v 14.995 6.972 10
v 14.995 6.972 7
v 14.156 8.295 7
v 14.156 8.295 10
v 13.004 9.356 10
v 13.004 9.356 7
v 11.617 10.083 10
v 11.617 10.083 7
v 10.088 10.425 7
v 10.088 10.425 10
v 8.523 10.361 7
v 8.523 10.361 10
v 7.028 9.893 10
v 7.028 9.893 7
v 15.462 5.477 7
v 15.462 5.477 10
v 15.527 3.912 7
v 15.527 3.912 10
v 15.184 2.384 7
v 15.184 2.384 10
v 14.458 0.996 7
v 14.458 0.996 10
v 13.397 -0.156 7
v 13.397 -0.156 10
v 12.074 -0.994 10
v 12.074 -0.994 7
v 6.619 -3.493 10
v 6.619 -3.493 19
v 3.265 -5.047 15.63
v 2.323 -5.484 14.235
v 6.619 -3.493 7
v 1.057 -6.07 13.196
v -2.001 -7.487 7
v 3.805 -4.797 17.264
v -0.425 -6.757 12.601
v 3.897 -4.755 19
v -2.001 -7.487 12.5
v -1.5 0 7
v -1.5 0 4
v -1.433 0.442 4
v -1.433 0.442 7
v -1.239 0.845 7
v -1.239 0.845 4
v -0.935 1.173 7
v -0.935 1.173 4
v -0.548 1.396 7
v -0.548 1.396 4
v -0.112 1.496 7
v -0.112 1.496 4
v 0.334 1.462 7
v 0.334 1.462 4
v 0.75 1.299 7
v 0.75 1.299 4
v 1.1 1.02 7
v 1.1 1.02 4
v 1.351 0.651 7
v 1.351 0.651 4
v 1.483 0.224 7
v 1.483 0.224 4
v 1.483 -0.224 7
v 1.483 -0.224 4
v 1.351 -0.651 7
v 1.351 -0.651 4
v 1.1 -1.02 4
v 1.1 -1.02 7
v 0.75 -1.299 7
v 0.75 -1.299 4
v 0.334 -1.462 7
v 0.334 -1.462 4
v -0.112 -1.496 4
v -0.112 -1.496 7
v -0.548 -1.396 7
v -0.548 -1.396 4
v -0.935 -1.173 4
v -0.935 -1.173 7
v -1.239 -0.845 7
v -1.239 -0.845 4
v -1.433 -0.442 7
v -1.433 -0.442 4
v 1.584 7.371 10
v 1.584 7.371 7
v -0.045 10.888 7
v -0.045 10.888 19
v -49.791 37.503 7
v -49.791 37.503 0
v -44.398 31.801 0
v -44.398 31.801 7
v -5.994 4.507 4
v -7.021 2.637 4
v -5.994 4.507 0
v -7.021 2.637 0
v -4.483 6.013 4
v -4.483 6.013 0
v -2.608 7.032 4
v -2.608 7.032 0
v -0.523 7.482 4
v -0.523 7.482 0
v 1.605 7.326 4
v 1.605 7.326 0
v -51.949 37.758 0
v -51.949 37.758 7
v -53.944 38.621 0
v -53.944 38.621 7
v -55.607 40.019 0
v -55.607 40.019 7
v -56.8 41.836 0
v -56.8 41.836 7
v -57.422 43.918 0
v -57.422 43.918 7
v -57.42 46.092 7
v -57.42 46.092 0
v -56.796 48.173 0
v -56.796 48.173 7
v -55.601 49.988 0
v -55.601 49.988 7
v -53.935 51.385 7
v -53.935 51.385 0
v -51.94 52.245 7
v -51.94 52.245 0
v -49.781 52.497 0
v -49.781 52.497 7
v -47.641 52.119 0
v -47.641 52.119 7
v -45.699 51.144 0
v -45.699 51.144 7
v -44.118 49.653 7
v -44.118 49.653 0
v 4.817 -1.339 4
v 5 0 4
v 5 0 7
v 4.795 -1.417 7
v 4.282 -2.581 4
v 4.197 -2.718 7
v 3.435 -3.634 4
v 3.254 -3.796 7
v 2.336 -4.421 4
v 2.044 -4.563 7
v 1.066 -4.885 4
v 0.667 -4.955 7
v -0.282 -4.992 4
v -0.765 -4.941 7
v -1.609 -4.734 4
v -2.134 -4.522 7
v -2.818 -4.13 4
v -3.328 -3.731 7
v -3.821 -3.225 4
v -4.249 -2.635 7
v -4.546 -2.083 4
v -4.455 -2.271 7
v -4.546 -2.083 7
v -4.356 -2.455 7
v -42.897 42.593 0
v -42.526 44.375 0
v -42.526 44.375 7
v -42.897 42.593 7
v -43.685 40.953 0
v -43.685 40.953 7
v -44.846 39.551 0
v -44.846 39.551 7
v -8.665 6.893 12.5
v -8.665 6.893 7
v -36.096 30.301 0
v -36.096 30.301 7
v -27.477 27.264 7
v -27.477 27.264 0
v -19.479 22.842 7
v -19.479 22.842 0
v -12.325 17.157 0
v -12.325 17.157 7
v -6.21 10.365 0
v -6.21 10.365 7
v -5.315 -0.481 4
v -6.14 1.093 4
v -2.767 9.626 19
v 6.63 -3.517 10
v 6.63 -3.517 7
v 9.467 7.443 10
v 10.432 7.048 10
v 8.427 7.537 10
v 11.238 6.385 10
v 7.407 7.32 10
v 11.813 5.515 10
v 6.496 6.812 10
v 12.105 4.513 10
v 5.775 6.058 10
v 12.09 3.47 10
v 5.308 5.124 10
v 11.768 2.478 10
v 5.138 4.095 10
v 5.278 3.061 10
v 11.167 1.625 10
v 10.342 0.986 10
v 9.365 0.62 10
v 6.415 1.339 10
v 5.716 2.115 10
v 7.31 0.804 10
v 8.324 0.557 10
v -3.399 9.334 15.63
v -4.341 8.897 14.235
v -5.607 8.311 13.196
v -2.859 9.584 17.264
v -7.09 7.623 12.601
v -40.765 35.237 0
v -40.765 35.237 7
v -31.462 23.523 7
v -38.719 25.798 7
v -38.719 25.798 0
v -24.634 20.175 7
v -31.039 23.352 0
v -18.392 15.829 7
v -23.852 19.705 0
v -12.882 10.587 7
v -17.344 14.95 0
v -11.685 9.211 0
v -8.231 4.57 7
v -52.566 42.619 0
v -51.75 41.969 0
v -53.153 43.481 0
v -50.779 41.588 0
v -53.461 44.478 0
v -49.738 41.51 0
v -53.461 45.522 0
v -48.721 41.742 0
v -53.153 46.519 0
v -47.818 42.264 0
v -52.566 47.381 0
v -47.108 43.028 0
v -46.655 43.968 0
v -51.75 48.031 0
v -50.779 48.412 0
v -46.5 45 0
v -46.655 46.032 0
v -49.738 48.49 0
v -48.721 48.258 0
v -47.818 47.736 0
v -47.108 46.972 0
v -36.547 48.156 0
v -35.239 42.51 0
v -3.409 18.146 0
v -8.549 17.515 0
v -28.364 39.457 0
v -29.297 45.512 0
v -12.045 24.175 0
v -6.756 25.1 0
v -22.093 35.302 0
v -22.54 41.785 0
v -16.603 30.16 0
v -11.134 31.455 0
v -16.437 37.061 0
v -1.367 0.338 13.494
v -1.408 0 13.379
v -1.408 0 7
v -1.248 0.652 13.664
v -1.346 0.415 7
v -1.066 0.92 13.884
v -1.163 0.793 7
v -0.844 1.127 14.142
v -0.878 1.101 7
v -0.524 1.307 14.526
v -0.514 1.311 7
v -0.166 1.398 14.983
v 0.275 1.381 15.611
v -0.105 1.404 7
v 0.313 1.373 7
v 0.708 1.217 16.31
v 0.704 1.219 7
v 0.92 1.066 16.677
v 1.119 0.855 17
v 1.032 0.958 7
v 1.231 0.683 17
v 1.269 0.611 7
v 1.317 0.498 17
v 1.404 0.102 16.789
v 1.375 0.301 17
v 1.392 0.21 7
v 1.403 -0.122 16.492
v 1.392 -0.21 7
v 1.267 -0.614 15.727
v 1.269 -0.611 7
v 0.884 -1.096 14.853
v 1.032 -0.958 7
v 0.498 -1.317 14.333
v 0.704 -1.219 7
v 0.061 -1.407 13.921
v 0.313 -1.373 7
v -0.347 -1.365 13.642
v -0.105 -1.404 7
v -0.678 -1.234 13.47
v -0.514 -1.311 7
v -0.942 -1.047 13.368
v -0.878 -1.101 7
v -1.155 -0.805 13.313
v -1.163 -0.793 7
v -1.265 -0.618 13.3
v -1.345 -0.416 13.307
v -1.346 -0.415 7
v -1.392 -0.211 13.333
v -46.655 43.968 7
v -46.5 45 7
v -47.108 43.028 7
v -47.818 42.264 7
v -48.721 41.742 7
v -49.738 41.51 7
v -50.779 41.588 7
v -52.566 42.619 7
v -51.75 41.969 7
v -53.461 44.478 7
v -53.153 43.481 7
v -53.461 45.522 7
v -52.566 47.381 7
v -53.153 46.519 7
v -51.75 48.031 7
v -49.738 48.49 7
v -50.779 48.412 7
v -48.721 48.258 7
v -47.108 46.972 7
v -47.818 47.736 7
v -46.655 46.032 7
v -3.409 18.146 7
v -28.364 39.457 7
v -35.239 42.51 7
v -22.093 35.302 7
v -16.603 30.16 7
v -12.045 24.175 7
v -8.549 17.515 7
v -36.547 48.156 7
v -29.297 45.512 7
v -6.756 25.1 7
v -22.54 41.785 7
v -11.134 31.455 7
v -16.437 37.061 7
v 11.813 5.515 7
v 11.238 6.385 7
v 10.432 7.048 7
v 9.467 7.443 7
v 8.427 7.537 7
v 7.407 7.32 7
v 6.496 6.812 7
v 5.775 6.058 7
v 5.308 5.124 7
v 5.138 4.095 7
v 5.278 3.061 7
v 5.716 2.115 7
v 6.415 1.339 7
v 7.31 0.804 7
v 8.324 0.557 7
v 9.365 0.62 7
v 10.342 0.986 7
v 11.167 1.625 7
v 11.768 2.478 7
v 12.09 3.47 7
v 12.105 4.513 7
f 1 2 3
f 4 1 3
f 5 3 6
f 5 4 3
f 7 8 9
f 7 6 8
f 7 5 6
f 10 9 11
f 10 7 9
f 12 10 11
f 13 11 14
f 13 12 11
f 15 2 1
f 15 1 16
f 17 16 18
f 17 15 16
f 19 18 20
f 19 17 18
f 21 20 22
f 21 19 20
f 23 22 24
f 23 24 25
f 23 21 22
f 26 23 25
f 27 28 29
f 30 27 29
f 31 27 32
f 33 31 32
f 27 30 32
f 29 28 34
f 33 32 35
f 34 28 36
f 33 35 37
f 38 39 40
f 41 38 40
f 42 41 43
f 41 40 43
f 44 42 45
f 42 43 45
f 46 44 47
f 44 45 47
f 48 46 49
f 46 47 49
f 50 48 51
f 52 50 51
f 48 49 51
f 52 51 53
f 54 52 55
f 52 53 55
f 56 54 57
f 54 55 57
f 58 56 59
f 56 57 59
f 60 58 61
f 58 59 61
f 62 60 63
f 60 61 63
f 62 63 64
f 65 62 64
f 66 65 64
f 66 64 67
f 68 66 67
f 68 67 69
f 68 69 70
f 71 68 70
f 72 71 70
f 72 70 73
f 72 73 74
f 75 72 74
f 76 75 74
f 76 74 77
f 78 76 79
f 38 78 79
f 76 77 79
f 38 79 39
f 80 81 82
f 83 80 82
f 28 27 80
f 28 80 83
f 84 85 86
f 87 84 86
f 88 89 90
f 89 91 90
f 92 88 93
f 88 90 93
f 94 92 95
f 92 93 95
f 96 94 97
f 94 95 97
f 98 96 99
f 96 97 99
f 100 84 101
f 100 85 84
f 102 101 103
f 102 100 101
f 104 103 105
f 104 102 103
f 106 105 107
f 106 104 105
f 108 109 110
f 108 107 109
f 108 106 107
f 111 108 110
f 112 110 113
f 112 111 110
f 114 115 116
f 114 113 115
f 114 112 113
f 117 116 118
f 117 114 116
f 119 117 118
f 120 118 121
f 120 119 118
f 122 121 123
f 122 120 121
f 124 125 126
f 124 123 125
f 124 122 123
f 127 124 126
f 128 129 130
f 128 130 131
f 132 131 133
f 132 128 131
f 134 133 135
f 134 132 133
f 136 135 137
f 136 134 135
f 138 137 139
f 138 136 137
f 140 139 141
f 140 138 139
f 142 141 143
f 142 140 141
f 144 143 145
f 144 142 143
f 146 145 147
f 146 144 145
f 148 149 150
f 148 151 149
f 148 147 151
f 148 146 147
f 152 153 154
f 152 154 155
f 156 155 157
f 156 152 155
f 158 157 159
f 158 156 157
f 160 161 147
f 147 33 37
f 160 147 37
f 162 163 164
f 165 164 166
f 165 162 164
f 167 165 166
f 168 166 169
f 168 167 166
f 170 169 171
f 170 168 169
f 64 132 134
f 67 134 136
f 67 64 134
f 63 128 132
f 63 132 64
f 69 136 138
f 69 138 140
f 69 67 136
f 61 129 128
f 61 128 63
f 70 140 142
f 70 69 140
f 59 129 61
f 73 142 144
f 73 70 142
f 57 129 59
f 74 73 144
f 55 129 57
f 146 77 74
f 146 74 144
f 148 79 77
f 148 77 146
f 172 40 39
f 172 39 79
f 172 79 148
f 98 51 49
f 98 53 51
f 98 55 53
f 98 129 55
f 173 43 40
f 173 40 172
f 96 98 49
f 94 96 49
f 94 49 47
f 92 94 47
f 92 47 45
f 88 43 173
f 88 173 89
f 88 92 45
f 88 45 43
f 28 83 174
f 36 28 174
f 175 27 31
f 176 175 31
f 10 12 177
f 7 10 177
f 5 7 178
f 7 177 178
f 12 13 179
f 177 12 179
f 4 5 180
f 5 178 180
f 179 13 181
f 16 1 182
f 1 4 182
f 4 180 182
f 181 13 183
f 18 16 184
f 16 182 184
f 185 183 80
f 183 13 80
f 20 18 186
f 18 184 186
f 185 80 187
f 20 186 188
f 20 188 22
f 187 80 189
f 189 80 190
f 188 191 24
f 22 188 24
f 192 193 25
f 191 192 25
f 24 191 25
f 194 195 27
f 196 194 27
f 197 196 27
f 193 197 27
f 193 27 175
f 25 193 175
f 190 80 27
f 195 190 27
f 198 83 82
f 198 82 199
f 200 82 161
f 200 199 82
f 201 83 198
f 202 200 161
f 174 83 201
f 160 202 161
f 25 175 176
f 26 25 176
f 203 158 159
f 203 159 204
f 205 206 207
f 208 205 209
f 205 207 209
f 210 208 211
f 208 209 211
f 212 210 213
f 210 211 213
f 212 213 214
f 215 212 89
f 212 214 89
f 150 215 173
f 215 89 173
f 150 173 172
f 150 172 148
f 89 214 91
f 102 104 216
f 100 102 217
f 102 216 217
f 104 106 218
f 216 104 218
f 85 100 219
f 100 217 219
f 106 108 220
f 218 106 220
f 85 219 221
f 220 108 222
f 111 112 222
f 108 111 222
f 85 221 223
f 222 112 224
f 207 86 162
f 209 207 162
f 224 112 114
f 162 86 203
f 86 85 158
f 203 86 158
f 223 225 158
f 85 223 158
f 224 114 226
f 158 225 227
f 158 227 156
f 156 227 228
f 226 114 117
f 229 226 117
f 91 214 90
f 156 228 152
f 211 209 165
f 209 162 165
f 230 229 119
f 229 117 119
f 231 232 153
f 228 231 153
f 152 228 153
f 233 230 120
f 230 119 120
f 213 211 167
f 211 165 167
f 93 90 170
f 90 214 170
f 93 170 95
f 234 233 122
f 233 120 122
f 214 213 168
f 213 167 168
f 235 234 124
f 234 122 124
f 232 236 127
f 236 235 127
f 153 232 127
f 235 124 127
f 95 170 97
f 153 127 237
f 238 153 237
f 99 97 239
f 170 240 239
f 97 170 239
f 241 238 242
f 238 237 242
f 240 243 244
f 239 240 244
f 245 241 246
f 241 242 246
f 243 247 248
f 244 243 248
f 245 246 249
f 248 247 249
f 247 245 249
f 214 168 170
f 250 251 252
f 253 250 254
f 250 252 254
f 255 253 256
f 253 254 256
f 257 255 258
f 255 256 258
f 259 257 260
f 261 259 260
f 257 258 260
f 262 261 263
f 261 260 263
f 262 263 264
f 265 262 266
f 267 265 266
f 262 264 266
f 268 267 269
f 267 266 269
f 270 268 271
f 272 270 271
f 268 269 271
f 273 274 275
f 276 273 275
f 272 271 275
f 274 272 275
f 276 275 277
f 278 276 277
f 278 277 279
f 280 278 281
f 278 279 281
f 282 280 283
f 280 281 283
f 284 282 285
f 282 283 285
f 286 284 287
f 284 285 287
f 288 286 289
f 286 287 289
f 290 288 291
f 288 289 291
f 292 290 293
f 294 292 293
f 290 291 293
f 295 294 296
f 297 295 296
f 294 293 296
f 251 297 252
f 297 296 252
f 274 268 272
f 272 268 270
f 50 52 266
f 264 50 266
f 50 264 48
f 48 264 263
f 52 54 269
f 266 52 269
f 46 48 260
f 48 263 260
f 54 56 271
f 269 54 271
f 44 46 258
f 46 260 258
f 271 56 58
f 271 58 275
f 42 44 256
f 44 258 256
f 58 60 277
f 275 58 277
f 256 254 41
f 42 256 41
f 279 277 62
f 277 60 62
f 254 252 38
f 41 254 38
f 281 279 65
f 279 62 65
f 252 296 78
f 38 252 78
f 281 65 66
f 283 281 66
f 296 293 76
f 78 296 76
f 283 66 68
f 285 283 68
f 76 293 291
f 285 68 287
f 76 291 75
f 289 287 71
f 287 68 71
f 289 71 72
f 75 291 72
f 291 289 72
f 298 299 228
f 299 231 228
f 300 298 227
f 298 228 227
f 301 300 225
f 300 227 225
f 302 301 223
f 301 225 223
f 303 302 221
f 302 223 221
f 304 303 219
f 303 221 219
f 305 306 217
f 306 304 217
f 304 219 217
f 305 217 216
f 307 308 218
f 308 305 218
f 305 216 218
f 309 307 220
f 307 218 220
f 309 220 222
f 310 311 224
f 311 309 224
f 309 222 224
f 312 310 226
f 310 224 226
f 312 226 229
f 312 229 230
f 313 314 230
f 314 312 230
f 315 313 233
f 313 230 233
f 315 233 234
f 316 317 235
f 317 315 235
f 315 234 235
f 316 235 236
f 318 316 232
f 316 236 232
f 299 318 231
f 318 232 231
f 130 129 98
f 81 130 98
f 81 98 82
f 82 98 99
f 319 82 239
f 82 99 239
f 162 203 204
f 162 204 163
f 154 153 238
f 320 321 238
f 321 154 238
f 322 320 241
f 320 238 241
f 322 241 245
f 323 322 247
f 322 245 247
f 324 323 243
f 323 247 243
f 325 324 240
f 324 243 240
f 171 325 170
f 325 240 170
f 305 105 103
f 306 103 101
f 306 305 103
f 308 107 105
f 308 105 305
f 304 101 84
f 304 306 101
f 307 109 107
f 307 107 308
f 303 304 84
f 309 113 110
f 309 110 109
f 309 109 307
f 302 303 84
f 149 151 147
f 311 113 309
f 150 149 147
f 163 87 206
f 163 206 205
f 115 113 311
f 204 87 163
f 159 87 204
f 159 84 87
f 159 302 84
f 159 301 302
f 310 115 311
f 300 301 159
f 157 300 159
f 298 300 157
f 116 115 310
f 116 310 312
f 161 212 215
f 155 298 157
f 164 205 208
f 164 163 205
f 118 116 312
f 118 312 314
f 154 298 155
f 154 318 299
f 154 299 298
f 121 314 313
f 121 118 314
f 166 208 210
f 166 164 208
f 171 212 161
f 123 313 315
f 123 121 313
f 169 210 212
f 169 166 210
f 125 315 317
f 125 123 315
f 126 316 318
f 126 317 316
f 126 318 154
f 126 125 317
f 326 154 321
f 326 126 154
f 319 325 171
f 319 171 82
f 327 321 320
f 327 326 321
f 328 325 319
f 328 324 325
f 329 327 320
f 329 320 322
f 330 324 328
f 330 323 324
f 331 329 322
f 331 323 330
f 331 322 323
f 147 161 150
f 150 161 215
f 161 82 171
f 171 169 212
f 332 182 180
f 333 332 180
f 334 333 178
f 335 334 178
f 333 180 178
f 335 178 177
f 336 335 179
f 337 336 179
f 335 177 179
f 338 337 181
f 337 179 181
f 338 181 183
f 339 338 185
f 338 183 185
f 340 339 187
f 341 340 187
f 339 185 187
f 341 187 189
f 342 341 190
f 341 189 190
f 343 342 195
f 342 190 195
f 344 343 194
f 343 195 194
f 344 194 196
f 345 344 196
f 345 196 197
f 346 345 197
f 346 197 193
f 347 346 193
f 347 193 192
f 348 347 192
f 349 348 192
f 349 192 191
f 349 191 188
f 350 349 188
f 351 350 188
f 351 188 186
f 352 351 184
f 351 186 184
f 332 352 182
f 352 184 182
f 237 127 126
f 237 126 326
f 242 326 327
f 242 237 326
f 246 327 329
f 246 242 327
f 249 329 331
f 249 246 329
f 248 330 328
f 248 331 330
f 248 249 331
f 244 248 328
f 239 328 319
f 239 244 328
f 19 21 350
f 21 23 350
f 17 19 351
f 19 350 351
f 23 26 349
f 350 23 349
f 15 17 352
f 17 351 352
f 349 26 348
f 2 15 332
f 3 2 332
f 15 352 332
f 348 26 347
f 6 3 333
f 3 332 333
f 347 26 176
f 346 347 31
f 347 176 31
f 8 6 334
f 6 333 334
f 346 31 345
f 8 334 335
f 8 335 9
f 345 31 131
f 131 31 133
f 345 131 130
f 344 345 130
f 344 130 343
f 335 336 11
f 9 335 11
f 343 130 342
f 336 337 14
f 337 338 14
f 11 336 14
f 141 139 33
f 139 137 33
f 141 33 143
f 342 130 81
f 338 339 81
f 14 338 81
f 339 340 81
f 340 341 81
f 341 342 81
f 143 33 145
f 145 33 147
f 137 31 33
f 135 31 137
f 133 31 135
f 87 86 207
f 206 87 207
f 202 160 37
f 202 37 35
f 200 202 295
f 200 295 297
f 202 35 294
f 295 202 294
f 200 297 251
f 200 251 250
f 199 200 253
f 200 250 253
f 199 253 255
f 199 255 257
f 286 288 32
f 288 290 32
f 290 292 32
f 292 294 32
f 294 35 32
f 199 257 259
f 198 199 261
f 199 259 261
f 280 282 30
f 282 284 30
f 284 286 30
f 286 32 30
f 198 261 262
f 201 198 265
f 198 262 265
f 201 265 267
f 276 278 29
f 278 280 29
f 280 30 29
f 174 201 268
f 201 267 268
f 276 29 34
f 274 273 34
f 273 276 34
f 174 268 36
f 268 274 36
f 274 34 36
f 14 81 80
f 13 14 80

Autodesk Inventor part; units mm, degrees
ref_plane "YZ Plane" through (0, 0, 0) normal (1, 0, 0) x (0, 1, 0)
ref_plane "XZ Plane" through (0, 0, 0) normal (0, 1, 0) x (-1, 0, 0)
sketch "Sketch1" plane through (0, 0, 0) normal (0, 0, 1) x (1, 0, 0)
  arc A0 (-3.4091, 18.1463) -> (-44.1177, 49.6528) centre (-50, 0) ccw
  arc A1 (-4.5455, -2.083) -> (-38.7191, 25.7979) centre (-50, -22.9129) ccw
  arc A2 (-6.2101, 10.3653) -> (-42.5261, 44.375) centre (-50, 0) ccw
  line L0 (5, 0) -> (-3.4091, 18.1463)
  arc A3 (-4.5455, -2.083) -> (5, 0) centre (0, 0) ccw
  line L1 (-50, 32.0871) -> (-50, 50) construction
  line L2 (-50, 37.7239) -> (-44.3975, 31.801)
  line L3 (-44.8461, 39.5514) -> (-40.7651, 35.237)
  line L4 (-44.3975, 31.801) -> (-38.7191, 25.7979)
  line L5 (-40.7651, 35.237) -> (-36.0957, 30.3006)
  arc A4 (-6.2101, 10.3653) -> (-36.0957, 30.3006) centre (-50, -22.9129) ccw
  circle A5 centre (-50, 45) radius 3.5
  arc A6 (-44.8461, 39.5514) -> (-42.5261, 44.375) centre (-50, 45) ccw
  arc A7 (-44.1177, 49.6528) -> (-49.7909, 37.5029) centre (-50, 45) ccw
  point P0 (19.05, 139.7)
  dimension "d65" = 5
  dimension "d66" = 20
  dimension "d74" = 5
  dimension "d75" = 7
extrude "Extrusion12" add sketch "Sketch1" along normal blind 7
sketch "Sketch16" plane through (0, 0, 7) normal (0, 0, 1) x (1, 0, 0)
  point P0 (0, 0)
sketch "Sketch19" plane through (0, 0, 0) normal (0, 0, -1) x (-1, 0, 0)
  circle A0 centre (0, 0) radius 1.5
  dimension "d101" = 3
extrude "Extrusion16" cut sketch "Sketch19" against normal blind 10
sketch "Sketch24" plane through (0, 0, 0) normal (0, 0, -1) x (-1, 0, 0)
  circle A0 centre (0, 0) radius 1.5 projected
  circle A1 centre (0, 0) radius 7.5
  dimension "d115" = 15
extrude "Extrusion19" cut sketch "Sketch24" against normal blind 4
ref_plane "Work Plane9" through (5, 0, 7) normal (-0.4204545, 0.9073136, 0) x (-0.9073136, -0.4204545, 0)
sketch "Sketch25" plane through (0, 0, 7) normal (0, 0, 1) x (1, 0, 0)
  point P0 (0, 0)
sketch "Sketch26" plane through (5, 0, 7) normal (-0.4204545, 0.9073136, 0) x (-0.9073136, -0.4204545, 0)
  point P0 (4.5366, -7)
sketch "Sketch27" plane through (5, 0, 7) normal (-0.4204545, 0.9073136, 0) x (-0.9073136, -0.4204545, 0)
  line L0 (0, -7) -> (0, 0) projected
  line L1 (0, 0) -> (0, 12)
  line L2 (0, 12) -> (3, 12)
  line L3 (0, 0) -> (9.5, 0)
  line L4 (24.5467, 0) -> (5.8129, 0) projected
  line L5 (9.5, 0) -> (9.5, 5.5)
  arc A0 (3, 12) -> (9.5, 5.5) centre (8.9772, 11.4772) ccw
  point P0 (4.5366, -7)
  dimension "d118" = 12
  dimension "d119" = 3
  dimension "d120" = 9.5
  dimension "d121" = 5.5
  dimension "d122" = 6
extrude "Extrusion20" add sketch "Sketch27" along normal blind 12 and the other way blind 3.85
sketch "Sketch30" plane through (0, 0, 4) normal (0, 0, -1) x (-1, 0, 0)
  line L0 (0, 0) -> (-4.9989, 2.3165)
  line L1 (-5, 0) -> (-1.605, 7.3263) projected
sketch "Sketch31" plane through (-3.4091, 18.1463, 7) normal (0.9073136, 0.4204545, 0) x (0, 0, -1)
  line L0 (-15.8, -20) -> (10.8, -20) projected
  line L1 (3, -17.8765) -> (3, -12.5529) projected
  line L2 (3, -17.8765) -> (3, -11.8765)
  line L3 (3, -11.8765) -> (0, -11.8765)
  line L4 (3, -17.8765) -> (0, -17.8765) projected
  line L5 (3, -17.8765) -> (3, -23.8765)
  line L6 (3, -17.8765) -> (3, -22.8977) projected
  line L7 (0, -11.8765) -> (-3, -11.8765)
  line L8 (-3, -11.8765) -> (-3, -23.8765)
  line L9 (-3, -23.8765) -> (0, -23.8765)
  line L10 (0, -23.8765) -> (0, -11.8765)
  point P0 (7, -17.8977)
  point P1 (3, -20)
  dimension "d129" = 6
  dimension "d130" = 3
  dimension "d131" = 6
  dimension "d132" = 3
extrude "Extrusion21" add sketch "Sketch31" along normal blind 12 contours L8 L7 L10 L0 | L0 L10 L9 L8
sketch "Sketch32" plane through (6.6188, -3.4932, 10) normal (0, 0, 1) x (0.9073136, 0.4204545, 0)
  line L0 (0, 11.9735) -> (0, 3.85) projected
  line L1 (0, 6) -> (5, 5.9892) construction
  circle A0 centre (5, 5.9892) radius 3.5
  line L2 (6, 11.9735) -> (6, -0.0265) construction
  arc A1 (0, 6.0179) -> (0, 5.9604) centre (5, 5.9892) ccw
  line L3 (6, -0.0265) -> (12, -0.0265)
  point P0 (-4.5366, 5.9523)
  point P1 (12, 11.9735)
  dimension "d139" = 5
  dimension "d140" = 7
extrude "Extrusion22" cut sketch "Sketch32" against normal blind 3
fillet "Fillet5" radius 6 2 edges at (12.4722, 12.416, 8.5) (17.5177, 1.5283, 8.5)
sketch "Sketch33" plane through (0, 0, 7) normal (0, 0, -1) x (-1, 0, 0)
  circle A0 centre (0, 0) radius 1.4081
extrude "Extrusion23" cut sketch "Sketch33" against normal blind 10
properties part number "Beta_index"
